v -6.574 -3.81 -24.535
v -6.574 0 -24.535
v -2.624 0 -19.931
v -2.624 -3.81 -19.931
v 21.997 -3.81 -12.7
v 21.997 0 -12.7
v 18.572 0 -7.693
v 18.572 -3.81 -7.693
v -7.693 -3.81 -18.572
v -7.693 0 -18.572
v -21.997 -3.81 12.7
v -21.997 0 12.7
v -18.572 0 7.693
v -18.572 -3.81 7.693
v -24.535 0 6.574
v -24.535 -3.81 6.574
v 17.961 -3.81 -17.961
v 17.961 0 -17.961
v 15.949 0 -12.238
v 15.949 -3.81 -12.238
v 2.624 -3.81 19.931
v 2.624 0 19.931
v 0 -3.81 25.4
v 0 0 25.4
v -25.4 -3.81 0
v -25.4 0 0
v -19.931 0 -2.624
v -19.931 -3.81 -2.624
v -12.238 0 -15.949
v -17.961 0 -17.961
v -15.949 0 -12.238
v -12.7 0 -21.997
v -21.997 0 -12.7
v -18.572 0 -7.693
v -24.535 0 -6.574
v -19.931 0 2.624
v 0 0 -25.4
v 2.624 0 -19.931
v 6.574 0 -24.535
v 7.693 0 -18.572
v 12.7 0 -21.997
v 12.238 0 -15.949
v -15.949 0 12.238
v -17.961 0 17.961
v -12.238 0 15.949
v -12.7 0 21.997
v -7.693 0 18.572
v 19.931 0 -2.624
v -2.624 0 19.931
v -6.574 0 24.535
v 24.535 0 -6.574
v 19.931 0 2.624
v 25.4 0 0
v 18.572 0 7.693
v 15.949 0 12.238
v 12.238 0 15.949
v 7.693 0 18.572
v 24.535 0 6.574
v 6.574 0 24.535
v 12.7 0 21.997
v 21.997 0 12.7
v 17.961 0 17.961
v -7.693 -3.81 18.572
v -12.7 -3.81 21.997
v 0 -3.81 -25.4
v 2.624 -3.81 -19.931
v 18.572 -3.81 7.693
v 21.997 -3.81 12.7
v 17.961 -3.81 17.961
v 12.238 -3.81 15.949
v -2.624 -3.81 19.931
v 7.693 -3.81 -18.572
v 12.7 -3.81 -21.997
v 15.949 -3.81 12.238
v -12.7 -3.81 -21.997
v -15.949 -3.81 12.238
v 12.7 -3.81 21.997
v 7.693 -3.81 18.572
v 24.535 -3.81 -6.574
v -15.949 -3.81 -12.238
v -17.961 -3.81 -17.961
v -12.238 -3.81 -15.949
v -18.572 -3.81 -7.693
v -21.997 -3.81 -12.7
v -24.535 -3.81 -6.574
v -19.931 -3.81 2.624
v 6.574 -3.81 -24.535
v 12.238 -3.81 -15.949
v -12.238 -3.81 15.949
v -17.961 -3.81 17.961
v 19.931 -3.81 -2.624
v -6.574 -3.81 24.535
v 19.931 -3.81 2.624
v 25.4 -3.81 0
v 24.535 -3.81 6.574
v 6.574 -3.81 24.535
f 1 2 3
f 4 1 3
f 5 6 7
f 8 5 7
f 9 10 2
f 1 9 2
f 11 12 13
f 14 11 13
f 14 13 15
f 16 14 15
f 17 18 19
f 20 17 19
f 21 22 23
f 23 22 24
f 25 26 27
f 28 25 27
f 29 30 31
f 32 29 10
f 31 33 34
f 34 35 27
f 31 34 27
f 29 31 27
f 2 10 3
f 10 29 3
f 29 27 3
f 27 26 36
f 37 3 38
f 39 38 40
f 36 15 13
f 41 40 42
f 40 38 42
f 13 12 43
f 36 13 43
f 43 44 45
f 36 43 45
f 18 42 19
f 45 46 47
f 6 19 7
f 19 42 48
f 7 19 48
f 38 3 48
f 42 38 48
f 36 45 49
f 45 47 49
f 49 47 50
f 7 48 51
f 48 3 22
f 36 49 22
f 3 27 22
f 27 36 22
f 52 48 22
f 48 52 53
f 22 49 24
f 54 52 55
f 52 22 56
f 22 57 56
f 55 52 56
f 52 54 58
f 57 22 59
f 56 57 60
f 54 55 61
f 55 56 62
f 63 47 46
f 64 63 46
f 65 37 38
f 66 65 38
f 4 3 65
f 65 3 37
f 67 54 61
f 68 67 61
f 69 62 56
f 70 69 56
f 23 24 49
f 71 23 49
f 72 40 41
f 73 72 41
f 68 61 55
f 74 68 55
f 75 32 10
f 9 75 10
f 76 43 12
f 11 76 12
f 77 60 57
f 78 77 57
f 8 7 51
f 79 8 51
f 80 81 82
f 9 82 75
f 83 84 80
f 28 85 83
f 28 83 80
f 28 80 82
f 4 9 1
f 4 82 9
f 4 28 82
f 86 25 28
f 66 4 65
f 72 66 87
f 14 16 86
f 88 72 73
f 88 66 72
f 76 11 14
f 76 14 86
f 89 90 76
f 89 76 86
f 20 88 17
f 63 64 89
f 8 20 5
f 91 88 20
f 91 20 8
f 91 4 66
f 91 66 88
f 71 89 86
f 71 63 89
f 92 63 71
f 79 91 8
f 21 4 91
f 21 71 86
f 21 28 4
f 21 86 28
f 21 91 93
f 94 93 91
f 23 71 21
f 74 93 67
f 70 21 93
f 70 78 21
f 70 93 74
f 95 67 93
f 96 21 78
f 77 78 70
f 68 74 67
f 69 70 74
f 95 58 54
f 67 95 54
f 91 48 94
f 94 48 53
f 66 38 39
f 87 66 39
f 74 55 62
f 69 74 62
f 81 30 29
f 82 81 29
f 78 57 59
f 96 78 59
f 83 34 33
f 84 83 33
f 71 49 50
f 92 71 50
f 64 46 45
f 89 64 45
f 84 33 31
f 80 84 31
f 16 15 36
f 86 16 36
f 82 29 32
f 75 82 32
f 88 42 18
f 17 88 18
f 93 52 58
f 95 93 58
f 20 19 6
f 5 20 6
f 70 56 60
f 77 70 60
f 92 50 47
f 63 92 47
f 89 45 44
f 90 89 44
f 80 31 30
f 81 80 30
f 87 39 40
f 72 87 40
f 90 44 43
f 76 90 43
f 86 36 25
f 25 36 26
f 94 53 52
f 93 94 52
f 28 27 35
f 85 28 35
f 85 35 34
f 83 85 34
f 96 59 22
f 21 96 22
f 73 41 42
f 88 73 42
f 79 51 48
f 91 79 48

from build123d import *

# Parameters (mm, degrees)
F1_DEPTH = 3.81


with BuildPart() as f1:
    # F0 (on Front) → F1 (new body)
    with BuildSketch(Plane.XZ):
        Polygon((24.534516, 6.574004), (0, 0), (25.4, 0), (19.930718, 2.623929), align=None)
        Polygon((-6.574004, 24.534516), (0, 0), (0, 25.4), (-2.623929, 19.930718), align=None)
        Polygon((-24.534516, -6.574004), (0, 0), (-25.4, 0), (-19.930718, -2.623929), align=None)
        Polygon((6.574004, -24.534516), (0, 0), (0, -25.4), (2.623929, -19.930718), align=None)
        Polygon((25.4, 0), (0, 0), (24.534516, -6.574004), (19.930718, -2.623929), align=None)
        Polygon((21.997045, 12.7), (0, 0), (24.534516, 6.574004), (18.572473, 7.69297), align=None)
        Polygon((17.960512, 17.960512), (0, 0), (21.997045, 12.7), (15.948544, 12.237748), align=None)
        Polygon((12.7, 21.997045), (0, 0), (17.960512, 17.960512), (12.237748, 15.948544), align=None)
        Polygon((6.574004, 24.534516), (0, 0), (12.7, 21.997045), (7.69297, 18.572473), align=None)
        Polygon((0, 25.4), (0, 0), (6.574004, 24.534516), (2.623929, 19.930718), align=None)
        Polygon((0, -25.4), (0, 0), (-6.574004, -24.534516), (-2.623929, -19.930718), align=None)
        Polygon((24.534516, -6.574004), (0, 0), (21.997045, -12.7), (18.572473, -7.69297), align=None)
        Polygon((21.997045, -12.7), (0, 0), (17.960512, -17.960512), (15.948544, -12.237748), align=None)
        Polygon((17.960512, -17.960512), (0, 0), (12.7, -21.997045), (12.237748, -15.948544), align=None)
        Polygon((12.7, -21.997045), (0, 0), (6.574004, -24.534516), (7.69297, -18.572473), align=None)
        Polygon((-6.574004, -24.534516), (0, 0), (-12.7, -21.997045), (-7.69297, -18.572473), align=None)
        Polygon((-12.7, -21.997045), (0, 0), (-17.960512, -17.960512), (-12.237748, -15.948544), align=None)
        Polygon((-17.960512, -17.960512), (0, 0), (-21.997045, -12.7), (-15.948544, -12.237748), align=None)
        Polygon((-21.997045, -12.7), (0, 0), (-24.534516, -6.574004), (-18.572473, -7.69297), align=None)
        Polygon((-25.4, 0), (0, 0), (-24.534516, 6.574004), (-19.930718, 2.623929), align=None)
        Polygon((-24.534516, 6.574004), (0, 0), (-21.997045, 12.7), (-18.572473, 7.69297), align=None)
        Polygon((-21.997045, 12.7), (0, 0), (-17.960512, 17.960512), (-15.948544, 12.237748), align=None)
        Polygon((-17.960512, 17.960512), (0, 0), (-12.7, 21.997045), (-12.237748, 15.948544), align=None)
        Polygon((-12.7, 21.997045), (0, 0), (-6.574004, 24.534516), (-7.69297, 18.572473), align=None)
    extrude(amount=F1_DEPTH)


solid = f1.part
